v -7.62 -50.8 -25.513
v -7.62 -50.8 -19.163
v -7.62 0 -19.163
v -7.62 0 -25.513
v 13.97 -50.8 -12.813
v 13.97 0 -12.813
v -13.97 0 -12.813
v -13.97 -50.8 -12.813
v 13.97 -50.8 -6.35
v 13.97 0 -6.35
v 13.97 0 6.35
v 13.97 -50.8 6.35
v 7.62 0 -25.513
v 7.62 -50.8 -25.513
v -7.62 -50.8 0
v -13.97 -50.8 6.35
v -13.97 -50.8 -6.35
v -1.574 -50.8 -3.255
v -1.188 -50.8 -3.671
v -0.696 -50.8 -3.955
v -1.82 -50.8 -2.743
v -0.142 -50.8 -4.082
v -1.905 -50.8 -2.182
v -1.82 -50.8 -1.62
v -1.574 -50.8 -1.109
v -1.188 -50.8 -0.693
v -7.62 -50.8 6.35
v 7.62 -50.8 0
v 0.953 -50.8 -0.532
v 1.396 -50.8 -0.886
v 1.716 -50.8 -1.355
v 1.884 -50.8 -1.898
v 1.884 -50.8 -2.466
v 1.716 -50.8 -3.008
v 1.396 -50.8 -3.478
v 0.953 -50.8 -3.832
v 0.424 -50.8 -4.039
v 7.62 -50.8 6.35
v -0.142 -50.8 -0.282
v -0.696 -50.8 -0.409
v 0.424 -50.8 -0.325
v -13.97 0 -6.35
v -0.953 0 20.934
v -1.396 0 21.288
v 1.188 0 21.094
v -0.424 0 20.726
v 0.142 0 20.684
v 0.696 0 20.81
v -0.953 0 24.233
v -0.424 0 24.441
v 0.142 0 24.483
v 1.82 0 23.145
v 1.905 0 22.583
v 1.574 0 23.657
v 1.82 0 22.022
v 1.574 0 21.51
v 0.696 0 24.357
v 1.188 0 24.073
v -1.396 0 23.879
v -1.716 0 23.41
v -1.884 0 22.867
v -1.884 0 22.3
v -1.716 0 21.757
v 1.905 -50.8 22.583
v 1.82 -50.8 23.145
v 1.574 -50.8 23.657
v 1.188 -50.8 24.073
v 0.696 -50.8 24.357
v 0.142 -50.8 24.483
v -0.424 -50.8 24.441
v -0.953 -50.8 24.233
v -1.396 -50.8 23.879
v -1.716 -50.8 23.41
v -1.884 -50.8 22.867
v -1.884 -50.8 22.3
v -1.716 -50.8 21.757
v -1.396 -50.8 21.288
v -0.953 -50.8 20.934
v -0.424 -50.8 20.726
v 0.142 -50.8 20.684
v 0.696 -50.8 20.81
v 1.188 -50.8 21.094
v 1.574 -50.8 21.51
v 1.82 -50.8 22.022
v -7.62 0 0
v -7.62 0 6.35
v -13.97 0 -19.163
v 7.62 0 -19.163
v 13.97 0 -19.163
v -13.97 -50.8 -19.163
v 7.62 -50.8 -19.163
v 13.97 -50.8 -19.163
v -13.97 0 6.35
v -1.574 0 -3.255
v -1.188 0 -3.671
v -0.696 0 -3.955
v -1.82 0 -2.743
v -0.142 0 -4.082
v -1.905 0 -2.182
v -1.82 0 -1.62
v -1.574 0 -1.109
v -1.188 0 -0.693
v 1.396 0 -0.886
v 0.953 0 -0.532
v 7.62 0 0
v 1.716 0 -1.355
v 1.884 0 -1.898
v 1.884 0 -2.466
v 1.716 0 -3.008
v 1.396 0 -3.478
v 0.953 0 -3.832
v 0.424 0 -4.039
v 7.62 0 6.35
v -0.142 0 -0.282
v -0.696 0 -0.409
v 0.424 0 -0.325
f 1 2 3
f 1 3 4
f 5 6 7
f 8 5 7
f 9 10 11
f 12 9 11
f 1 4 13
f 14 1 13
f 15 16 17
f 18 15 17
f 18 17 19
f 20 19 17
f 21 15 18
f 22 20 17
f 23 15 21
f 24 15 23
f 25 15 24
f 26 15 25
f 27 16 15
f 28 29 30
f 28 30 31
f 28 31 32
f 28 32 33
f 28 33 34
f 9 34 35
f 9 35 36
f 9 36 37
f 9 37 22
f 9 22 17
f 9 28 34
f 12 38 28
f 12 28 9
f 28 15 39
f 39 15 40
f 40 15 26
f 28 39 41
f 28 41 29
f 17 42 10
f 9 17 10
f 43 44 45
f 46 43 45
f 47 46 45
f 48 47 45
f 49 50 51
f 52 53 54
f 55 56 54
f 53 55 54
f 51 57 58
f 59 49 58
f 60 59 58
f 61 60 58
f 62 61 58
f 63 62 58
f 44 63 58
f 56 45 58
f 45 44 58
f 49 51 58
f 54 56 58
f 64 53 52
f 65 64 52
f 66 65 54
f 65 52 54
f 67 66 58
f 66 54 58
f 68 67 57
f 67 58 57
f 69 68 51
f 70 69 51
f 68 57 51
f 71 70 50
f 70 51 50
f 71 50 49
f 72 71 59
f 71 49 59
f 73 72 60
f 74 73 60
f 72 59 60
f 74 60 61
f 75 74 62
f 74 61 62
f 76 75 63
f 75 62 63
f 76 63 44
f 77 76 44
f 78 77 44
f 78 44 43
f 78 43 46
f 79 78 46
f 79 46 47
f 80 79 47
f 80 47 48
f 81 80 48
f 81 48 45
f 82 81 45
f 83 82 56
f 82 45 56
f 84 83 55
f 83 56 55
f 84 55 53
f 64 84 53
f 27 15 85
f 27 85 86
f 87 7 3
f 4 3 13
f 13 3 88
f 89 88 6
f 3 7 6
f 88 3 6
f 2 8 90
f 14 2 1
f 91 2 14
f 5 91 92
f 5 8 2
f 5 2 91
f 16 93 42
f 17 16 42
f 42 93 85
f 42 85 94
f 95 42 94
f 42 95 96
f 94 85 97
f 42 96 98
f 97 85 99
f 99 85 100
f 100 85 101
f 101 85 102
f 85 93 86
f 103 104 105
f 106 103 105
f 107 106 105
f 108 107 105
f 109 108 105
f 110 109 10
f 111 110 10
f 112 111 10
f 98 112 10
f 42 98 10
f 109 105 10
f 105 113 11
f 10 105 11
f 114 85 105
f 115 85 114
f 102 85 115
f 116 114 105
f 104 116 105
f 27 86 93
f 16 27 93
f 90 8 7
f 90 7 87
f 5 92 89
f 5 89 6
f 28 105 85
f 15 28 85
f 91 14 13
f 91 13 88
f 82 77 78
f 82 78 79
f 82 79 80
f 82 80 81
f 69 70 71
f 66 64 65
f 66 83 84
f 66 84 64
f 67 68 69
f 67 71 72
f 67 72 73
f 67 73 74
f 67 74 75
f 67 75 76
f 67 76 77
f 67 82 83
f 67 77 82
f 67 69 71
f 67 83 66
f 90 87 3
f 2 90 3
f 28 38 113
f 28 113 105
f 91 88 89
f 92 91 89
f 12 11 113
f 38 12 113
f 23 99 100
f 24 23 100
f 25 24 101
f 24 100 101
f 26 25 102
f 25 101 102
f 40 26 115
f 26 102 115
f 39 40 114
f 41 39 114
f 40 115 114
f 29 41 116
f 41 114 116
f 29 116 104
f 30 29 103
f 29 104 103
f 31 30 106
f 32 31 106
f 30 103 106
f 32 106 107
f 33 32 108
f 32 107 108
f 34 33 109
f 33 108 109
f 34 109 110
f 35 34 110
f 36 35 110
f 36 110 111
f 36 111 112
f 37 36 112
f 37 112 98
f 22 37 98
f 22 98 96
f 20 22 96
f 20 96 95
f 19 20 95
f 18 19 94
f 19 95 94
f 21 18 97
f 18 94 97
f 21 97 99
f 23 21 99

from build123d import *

# Parameters (mm, degrees)
F1_DEPTH = 50.8
F2_R     = 1.905
F3_DEPTH = 50.8
F0_R     = 1.905
F4_DEPTH = 50.8
F5_DEPTH = 50.8
F6_R     = 1.905
F7_DEPTH = 50.8


with BuildPart() as f1:
    # F0 (on Front) → F1 (new body)
    with BuildSketch(Plane.XZ):
        Polygon((7.62, 0), (0, 0), (-7.62, 0), (-7.62, 6.35), (-13.97, 6.35), (-13.97, -6.35), (0, -6.35), (13.97, -6.35), (13.97, 6.35), (7.62, 6.35), align=None)
    extrude(amount=F1_DEPTH)

    # F2 (on face) → F3 (cut)
    with BuildSketch(Plane.XZ.offset(50.8)):
        with Locations((0, -3.175)):
            Circle(F2_R)
    extrude(amount=-F3_DEPTH, mode=Mode.SUBTRACT)

    # F0 (on Front) → F4 (join)
    with BuildSketch(Plane.XZ):
        Polygon((13.97, -12.813103), (0, -12.813103), (-13.97, -12.813103), (-13.97, -19.163103), (-7.62, -19.163103), (-7.62, -25.513103), (7.62, -25.513103), (7.62, -19.163103), (13.97, -19.163103), align=None)
        Polygon((7.62, 0), (0, 0), (-7.62, 0), (-7.62, 6.35), (-13.97, 6.35), (-13.97, -6.35), (0, -6.35), (13.97, -6.35), (13.97, 6.35), (7.62, 6.35), align=None)
        with Locations((0, 22.583468)):
            Circle(F0_R)
    extrude(amount=F4_DEPTH)

    # F0 (on Front) → F5 (join)
    with BuildSketch(Plane.XZ):
        with Locations((0, 22.583468)):
            Circle(F0_R)
    extrude(amount=F5_DEPTH)

    # F6 (on face) → F7 (cut)
    with BuildSketch(Plane(origin=(0, 0, 0), x_dir=(-1, 0, 0), z_dir=(0, 1, 0))):
        with Locations((0, -2.181896)):
            Circle(F6_R)
    extrude(amount=-F7_DEPTH, mode=Mode.SUBTRACT)


solid = f1.part
